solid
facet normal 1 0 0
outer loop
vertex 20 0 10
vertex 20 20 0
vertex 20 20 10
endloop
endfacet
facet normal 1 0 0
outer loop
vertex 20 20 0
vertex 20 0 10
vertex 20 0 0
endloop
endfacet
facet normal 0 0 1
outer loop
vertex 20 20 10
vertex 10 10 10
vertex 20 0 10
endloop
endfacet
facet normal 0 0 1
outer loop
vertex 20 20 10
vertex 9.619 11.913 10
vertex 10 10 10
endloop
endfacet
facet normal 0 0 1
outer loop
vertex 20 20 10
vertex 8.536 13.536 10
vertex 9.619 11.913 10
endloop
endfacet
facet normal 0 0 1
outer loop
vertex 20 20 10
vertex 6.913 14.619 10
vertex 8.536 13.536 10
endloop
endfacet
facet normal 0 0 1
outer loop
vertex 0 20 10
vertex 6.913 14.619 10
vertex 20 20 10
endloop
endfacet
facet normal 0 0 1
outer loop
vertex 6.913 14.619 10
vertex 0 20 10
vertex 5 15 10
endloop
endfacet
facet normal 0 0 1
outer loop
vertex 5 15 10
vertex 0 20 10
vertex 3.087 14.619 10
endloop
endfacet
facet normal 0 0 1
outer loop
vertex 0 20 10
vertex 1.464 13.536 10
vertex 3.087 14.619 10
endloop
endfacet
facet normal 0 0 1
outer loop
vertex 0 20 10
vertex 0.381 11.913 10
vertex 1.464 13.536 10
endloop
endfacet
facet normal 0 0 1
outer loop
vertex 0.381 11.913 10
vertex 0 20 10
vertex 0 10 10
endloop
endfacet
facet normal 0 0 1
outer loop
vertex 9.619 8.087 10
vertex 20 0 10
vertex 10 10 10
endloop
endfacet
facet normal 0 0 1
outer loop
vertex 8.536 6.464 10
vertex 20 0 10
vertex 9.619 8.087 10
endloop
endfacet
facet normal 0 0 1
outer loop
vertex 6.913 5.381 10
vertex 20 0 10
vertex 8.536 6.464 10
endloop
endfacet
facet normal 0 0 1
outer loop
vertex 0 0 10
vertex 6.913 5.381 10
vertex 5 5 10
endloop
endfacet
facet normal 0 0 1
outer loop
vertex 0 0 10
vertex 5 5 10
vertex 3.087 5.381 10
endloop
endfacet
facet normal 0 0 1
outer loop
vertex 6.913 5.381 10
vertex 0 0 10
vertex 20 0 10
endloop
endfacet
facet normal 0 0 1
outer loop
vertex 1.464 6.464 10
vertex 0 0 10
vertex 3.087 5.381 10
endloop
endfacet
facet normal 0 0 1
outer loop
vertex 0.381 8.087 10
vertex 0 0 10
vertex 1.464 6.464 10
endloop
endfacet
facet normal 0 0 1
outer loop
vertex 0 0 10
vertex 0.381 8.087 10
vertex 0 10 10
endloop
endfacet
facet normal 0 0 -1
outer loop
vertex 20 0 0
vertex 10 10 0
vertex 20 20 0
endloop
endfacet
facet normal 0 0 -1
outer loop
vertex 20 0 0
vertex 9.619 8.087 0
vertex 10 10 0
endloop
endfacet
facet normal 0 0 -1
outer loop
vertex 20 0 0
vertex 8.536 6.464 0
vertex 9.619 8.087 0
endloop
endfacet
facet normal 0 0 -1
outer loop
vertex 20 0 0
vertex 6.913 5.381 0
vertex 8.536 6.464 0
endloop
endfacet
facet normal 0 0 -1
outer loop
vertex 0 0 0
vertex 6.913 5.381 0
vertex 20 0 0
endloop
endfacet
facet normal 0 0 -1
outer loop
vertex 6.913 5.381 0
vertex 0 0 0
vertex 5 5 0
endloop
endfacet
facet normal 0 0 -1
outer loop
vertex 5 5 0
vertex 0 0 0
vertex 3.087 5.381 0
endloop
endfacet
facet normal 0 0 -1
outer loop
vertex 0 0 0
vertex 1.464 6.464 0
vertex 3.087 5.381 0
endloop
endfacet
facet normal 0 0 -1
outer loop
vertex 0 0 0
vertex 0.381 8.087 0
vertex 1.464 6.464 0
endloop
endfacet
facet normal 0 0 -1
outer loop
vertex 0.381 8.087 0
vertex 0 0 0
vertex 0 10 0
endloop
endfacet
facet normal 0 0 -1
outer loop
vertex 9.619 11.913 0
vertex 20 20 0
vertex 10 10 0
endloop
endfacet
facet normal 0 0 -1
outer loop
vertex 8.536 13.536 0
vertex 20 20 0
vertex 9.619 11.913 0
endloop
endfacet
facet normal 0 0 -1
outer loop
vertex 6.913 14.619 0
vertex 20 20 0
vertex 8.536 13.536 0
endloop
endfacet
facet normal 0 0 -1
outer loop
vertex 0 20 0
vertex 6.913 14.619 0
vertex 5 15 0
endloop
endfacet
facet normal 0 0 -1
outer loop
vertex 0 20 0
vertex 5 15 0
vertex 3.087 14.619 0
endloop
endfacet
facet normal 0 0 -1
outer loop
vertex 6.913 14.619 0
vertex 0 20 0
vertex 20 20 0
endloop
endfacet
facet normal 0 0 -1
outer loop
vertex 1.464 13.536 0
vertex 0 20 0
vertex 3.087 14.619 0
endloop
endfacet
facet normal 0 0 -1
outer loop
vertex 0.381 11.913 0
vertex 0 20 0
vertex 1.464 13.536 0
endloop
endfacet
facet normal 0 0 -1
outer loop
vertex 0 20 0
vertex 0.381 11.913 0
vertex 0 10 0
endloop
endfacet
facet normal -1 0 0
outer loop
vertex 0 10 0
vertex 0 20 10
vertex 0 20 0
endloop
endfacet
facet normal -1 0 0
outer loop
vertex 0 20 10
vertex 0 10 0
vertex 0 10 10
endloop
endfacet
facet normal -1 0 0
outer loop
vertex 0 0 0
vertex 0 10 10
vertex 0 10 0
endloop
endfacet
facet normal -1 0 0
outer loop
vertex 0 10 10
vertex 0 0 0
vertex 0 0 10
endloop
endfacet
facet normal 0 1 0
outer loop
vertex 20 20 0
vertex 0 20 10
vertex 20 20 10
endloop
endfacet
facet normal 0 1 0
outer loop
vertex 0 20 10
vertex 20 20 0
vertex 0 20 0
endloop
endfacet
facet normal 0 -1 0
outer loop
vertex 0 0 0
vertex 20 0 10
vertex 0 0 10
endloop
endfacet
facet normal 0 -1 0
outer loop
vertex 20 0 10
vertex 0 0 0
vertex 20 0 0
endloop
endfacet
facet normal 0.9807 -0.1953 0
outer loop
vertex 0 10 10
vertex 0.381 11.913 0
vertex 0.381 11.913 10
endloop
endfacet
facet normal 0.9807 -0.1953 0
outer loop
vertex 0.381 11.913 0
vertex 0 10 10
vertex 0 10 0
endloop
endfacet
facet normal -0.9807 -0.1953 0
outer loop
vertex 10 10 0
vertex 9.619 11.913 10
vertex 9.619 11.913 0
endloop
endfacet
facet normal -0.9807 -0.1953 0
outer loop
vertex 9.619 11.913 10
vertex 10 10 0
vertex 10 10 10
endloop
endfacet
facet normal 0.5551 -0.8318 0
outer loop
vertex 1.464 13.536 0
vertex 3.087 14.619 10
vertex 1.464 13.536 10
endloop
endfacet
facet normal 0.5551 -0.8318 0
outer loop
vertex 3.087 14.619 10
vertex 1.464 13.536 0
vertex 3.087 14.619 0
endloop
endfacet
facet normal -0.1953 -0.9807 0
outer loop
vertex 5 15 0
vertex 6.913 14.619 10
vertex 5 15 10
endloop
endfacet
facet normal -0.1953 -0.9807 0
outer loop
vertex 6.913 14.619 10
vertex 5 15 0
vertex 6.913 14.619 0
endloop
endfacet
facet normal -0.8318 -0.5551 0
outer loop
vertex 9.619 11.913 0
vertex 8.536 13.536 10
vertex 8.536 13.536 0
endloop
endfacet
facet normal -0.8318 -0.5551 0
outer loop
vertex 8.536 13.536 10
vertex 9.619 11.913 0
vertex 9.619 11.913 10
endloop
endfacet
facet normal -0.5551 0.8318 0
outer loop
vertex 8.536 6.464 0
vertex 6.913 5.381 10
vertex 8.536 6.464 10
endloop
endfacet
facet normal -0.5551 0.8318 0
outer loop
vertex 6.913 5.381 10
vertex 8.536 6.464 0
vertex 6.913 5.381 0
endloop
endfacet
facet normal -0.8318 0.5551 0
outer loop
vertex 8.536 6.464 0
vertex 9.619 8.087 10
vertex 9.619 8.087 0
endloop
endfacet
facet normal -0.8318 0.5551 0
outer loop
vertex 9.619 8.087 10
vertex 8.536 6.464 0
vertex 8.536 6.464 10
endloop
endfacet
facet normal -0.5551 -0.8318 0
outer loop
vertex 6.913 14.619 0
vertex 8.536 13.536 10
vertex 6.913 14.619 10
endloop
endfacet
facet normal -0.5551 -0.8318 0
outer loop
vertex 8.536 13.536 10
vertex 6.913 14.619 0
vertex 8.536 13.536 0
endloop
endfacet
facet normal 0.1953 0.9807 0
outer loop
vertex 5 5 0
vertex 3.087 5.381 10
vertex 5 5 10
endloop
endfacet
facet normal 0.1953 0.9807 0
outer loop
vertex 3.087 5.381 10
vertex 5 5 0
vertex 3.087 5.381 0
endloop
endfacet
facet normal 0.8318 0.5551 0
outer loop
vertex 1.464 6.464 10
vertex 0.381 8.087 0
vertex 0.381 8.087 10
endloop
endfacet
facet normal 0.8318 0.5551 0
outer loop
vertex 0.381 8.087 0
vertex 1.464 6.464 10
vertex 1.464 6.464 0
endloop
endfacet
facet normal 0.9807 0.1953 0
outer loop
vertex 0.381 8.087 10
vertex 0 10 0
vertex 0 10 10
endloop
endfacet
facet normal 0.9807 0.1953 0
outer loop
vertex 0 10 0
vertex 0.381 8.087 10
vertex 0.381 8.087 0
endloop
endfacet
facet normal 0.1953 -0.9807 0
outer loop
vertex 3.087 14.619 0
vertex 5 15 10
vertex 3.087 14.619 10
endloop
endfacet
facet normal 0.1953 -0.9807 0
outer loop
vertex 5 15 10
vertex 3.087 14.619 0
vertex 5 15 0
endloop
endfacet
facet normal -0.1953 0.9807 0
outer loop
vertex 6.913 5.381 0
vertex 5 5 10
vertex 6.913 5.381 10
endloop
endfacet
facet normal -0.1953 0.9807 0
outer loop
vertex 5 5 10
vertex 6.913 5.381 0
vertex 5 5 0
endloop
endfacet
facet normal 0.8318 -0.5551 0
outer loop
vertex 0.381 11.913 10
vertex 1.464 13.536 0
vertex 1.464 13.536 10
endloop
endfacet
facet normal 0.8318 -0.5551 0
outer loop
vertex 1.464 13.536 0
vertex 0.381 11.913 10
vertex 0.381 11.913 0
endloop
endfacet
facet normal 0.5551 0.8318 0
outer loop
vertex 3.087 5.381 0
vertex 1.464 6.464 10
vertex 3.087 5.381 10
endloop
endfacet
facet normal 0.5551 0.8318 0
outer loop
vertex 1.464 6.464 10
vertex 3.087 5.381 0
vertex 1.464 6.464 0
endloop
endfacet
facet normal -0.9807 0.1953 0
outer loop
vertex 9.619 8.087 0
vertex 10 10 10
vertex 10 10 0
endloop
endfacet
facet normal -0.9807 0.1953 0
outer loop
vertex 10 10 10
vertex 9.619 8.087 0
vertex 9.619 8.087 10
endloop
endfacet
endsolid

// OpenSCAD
// The exact-geometry audit's case c15 (docs/audits/exact-geometry-rust.md).
// volume: 3214.601836602552
difference() { cube([20,20,10]); translate([5,10,-1]) cylinder(r=5, h=12); }
